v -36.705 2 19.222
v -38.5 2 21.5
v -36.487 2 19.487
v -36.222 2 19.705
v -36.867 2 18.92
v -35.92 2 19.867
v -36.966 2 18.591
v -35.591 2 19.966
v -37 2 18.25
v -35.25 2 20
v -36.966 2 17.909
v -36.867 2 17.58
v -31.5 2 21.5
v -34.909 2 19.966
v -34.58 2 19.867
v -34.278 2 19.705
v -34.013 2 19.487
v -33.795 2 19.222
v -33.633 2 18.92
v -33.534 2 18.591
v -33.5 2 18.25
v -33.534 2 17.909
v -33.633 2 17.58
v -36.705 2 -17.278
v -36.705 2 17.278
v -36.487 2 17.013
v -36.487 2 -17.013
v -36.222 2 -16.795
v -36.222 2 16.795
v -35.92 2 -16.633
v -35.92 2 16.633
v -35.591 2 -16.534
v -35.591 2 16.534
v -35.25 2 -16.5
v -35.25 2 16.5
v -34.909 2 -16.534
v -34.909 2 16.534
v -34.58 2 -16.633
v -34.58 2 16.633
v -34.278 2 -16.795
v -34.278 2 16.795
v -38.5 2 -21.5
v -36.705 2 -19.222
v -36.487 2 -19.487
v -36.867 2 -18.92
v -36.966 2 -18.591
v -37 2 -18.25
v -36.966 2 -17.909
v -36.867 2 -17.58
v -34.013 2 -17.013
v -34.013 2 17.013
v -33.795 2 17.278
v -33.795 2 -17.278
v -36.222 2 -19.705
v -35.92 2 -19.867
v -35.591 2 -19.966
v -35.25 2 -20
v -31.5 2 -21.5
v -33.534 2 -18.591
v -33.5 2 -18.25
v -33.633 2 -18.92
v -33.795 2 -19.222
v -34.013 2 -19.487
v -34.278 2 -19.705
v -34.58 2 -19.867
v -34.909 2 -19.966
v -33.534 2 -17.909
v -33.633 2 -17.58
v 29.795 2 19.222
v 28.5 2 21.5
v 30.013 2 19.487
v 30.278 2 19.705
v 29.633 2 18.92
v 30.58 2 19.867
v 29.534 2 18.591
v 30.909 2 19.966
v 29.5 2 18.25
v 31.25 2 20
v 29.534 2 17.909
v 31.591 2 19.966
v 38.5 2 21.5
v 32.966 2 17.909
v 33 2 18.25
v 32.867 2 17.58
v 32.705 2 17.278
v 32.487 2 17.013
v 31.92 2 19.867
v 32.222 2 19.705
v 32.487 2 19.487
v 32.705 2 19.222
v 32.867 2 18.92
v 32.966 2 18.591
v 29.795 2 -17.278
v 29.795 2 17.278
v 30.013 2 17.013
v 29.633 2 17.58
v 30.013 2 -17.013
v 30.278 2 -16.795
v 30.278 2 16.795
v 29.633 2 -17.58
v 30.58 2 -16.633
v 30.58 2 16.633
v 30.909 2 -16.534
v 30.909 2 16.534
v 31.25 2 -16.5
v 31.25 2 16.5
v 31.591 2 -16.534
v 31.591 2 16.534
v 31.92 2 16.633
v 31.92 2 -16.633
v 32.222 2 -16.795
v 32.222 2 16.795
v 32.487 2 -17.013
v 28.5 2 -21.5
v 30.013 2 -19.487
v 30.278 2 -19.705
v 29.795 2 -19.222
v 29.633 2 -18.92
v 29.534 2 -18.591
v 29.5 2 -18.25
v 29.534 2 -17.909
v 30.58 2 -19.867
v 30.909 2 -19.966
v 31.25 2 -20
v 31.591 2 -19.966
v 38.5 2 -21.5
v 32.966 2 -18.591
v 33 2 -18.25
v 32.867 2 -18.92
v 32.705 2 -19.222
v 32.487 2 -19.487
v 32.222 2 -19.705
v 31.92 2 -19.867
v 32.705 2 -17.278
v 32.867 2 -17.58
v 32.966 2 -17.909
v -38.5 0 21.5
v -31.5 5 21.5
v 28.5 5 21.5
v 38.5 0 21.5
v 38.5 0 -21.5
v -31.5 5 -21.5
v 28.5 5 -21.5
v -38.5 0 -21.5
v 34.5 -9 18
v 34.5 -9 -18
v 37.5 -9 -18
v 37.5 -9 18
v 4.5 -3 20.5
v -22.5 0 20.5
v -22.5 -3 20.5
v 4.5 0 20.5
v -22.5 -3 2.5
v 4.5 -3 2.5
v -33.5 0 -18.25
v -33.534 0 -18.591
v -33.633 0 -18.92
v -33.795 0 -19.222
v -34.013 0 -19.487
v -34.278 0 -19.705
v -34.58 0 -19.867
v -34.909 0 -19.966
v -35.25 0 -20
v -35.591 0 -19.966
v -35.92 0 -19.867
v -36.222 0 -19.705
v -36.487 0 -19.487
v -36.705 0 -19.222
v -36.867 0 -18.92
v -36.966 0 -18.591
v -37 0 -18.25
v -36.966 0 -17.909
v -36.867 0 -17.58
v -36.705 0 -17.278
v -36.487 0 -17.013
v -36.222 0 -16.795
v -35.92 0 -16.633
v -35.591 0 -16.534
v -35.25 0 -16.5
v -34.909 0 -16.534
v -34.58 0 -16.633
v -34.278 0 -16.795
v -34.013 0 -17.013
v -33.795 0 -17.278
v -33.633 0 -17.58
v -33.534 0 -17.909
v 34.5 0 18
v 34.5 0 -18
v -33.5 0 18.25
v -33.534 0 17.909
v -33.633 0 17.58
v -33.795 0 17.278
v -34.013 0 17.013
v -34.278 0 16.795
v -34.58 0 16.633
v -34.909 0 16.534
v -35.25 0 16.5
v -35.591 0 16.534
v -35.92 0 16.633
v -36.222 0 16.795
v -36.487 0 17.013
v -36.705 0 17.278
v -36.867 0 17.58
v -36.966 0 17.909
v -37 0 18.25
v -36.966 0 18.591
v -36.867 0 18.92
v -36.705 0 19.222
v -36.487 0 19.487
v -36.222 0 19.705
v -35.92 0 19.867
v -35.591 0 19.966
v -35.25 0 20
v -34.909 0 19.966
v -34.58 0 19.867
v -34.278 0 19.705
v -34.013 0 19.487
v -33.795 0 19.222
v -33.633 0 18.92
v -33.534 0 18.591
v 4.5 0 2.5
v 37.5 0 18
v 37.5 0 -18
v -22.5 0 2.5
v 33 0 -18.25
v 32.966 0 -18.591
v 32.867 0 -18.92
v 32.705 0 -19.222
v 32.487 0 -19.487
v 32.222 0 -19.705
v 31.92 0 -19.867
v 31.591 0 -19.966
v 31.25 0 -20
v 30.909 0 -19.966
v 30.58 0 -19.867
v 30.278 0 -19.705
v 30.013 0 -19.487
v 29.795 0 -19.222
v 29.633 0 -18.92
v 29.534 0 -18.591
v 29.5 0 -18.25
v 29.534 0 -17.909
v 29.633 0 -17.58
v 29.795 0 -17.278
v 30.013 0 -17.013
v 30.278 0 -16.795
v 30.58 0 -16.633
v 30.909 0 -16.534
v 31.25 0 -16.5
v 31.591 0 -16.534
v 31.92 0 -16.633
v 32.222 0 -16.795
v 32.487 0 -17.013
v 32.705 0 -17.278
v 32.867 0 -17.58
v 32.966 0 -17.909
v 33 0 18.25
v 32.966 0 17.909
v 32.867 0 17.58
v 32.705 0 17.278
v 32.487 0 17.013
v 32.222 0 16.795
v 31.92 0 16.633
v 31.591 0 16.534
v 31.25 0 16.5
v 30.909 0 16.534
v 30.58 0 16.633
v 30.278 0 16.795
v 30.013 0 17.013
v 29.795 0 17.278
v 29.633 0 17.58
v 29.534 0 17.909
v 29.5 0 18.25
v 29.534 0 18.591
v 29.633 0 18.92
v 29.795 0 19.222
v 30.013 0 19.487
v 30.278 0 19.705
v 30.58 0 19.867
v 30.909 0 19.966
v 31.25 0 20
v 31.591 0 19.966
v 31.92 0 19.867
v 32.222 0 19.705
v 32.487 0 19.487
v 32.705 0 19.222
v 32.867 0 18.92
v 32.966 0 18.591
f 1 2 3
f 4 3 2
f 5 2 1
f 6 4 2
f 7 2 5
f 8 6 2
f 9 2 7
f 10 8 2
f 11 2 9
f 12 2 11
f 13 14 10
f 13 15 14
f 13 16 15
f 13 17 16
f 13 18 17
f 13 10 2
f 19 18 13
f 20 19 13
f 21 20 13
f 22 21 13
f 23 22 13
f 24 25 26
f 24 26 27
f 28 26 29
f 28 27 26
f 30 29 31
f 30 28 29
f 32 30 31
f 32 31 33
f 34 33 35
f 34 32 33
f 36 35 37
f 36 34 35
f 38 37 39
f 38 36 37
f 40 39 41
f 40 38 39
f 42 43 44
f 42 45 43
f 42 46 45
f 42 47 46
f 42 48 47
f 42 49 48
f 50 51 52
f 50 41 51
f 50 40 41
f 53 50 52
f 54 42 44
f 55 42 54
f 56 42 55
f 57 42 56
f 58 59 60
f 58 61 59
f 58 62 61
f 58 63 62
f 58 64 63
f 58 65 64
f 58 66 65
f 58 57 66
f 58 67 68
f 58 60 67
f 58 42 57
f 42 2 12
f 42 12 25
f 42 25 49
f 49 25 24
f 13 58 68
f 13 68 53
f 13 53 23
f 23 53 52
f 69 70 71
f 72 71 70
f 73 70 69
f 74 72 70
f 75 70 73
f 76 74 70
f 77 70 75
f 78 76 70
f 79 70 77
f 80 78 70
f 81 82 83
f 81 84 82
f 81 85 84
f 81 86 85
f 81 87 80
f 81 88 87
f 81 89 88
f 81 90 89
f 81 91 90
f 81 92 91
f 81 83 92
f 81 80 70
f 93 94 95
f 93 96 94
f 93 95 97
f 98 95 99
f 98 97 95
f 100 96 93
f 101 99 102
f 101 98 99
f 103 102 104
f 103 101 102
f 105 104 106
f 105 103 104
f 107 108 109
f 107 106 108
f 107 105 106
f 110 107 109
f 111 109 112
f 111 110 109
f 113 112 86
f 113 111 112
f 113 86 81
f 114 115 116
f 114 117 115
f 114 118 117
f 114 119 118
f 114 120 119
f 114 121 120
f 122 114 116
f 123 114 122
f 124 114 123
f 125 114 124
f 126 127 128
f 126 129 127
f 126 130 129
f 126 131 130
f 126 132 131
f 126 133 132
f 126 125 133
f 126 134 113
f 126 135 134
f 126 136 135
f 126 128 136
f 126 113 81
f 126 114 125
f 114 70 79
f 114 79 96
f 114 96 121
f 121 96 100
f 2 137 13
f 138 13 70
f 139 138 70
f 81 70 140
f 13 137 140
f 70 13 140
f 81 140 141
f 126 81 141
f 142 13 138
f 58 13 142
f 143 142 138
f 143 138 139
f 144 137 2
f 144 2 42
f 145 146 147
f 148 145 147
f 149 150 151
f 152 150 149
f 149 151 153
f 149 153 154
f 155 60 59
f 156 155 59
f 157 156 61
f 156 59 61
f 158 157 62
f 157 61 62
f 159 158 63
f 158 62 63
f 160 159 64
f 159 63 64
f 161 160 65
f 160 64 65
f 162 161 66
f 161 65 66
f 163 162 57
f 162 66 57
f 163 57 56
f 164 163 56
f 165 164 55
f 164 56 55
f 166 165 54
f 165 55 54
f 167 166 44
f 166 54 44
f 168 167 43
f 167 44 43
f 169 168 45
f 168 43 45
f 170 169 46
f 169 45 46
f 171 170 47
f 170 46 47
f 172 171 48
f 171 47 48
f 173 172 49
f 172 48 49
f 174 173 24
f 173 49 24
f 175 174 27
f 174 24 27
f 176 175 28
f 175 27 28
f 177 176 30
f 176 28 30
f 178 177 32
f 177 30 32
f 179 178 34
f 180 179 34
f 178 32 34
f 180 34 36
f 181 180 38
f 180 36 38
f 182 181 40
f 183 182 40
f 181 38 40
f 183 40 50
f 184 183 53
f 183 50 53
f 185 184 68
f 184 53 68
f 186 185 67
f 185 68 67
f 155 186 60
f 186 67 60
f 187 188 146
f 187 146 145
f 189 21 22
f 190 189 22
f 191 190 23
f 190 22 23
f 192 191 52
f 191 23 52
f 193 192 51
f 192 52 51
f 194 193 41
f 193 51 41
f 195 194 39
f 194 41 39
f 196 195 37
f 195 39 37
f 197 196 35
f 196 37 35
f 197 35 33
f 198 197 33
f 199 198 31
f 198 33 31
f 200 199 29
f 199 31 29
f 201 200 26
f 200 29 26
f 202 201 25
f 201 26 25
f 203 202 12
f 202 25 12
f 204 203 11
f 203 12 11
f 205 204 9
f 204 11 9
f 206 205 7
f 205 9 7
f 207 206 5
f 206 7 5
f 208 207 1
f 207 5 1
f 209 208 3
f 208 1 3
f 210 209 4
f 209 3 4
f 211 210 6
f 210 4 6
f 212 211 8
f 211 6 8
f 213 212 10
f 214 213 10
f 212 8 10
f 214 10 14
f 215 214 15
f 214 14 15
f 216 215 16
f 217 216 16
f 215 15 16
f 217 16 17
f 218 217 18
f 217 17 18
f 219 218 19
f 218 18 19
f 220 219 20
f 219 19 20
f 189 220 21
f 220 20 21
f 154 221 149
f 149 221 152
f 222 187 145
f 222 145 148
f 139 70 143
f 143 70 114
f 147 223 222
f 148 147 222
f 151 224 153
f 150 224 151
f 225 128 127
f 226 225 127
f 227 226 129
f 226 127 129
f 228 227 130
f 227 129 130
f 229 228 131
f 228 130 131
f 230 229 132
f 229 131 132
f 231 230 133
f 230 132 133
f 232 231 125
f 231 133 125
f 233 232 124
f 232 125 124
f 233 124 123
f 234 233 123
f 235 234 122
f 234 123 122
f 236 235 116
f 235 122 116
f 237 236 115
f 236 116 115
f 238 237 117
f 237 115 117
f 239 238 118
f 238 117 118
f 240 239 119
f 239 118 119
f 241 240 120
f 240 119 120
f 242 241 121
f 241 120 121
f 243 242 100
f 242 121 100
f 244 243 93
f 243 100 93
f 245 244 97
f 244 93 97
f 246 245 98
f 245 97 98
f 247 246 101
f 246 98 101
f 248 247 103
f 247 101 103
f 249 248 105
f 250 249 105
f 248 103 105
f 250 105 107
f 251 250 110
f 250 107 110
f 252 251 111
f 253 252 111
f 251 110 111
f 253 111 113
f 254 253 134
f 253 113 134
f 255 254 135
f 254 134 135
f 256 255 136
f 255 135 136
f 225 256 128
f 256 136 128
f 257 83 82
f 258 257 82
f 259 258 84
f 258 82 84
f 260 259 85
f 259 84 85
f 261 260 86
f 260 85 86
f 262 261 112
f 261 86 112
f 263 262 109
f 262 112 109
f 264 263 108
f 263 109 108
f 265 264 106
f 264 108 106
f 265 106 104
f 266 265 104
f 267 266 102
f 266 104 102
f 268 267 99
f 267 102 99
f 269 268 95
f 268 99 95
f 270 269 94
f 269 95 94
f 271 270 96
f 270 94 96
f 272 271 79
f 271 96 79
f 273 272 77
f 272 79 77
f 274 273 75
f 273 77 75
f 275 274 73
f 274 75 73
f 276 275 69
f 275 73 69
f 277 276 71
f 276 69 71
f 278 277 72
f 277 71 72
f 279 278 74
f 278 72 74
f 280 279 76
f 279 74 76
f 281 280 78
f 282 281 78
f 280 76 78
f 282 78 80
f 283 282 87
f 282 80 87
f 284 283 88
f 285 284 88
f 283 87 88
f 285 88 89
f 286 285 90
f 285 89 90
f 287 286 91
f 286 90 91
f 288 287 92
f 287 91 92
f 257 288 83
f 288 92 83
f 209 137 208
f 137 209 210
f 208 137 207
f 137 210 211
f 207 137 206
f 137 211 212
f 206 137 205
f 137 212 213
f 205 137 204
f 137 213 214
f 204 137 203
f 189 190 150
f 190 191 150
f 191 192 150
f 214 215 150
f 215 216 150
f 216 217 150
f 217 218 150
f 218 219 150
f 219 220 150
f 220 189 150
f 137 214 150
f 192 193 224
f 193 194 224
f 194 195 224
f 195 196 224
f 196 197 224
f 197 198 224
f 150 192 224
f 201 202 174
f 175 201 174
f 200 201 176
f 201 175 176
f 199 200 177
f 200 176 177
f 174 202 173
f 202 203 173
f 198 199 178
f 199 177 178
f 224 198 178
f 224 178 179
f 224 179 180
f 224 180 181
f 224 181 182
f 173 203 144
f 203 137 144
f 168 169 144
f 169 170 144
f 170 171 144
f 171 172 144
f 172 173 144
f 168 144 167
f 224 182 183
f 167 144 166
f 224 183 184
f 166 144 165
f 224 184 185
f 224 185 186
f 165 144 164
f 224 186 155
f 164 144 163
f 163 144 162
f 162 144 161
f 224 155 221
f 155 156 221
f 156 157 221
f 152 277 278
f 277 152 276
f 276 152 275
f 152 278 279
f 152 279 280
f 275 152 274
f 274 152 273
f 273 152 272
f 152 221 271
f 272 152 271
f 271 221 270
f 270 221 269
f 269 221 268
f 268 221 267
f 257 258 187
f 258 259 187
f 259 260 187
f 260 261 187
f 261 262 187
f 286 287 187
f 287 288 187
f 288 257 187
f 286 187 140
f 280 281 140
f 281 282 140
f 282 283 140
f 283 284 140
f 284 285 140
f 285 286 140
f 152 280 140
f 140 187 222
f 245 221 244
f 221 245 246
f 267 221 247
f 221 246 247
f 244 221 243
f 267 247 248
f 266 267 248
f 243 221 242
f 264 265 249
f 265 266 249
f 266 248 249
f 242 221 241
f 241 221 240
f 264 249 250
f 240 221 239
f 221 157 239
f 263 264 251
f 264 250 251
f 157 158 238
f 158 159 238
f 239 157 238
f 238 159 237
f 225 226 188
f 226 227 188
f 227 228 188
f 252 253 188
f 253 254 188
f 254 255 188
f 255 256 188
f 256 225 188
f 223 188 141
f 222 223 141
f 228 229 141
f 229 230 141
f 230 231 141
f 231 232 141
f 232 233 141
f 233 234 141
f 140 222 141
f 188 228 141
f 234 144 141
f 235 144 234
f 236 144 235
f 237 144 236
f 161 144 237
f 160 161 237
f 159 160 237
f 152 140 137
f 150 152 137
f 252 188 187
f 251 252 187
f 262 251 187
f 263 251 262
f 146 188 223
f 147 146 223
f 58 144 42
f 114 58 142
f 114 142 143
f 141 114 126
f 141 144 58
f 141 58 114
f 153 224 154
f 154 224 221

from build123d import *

# Parameters (mm, degrees)
SKETCH1_W           = 60
SKETCH1_H           = 43
BOSS_EXTRUDE1_DEPTH = 5
SKETCH1_3_W         = 7
SKETCH1_3_H         = 43
SKETCH1_3_W_2       = 10
BOSS_EXTRUDE2_DEPTH = 2
SKETCH2_R           = 1.75
CUT_EXTRUDE1_DEPTH  = 2
SKETCH3_R           = 1.75
CUT_EXTRUDE2_DEPTH  = 2
SKETCH4_W           = 3
SKETCH4_H           = 36
BOSS_EXTRUDE3_DEPTH = 9
SKETCH5_W           = 27
SKETCH5_H           = 18
BOSS_EXTRUDE4_DEPTH = 3


with BuildPart() as part:
    # Sketch1 → Boss-Extrude1 (new body)
    with BuildSketch(Plane(origin=(0, 0, 0), x_dir=(1, 0, 0), z_dir=(0, 1, 0))):
        with Locations((-1.5, 0)):
            Rectangle(SKETCH1_W, SKETCH1_H)
    extrude(amount=BOSS_EXTRUDE1_DEPTH)

    # Sketch1<3> → Boss-Extrude2 (add)
    with BuildSketch(Plane(origin=(0, 0, 0), x_dir=(1, 0, 0), z_dir=(0, 1, 0))):
        with Locations((-35, 0)):
            Rectangle(SKETCH1_3_W, SKETCH1_3_H)
        with Locations((33.5, 0)):
            Rectangle(SKETCH1_3_W_2, SKETCH1_3_H)
    extrude(amount=BOSS_EXTRUDE2_DEPTH)

    # Sketch2 → Cut-Extrude1 (cut)
    with BuildSketch(Plane(origin=(0, 2, 0), x_dir=(1, 0, 0), z_dir=(0, 1, 0))):
        with Locations((31.25, 18.25)):
            Circle(SKETCH2_R)
        with Locations((31.25, -18.25)):
            Circle(SKETCH2_R)
    extrude(amount=-CUT_EXTRUDE1_DEPTH, mode=Mode.SUBTRACT)

    # Sketch3 → Cut-Extrude2 (cut)
    with BuildSketch(Plane(origin=(0, 2, 0), x_dir=(1, 0, 0), z_dir=(0, 1, 0))):
        with Locations((-35.25, 18.25)):
            Circle(SKETCH3_R)
        with Locations((-35.25, -18.25)):
            Circle(SKETCH3_R)
    extrude(amount=-CUT_EXTRUDE2_DEPTH, mode=Mode.SUBTRACT)

    # Sketch4 → Boss-Extrude3 (add)
    with BuildSketch(Plane.XZ):
        with Locations((36, 0)):
            Rectangle(SKETCH4_W, SKETCH4_H)
    extrude(amount=BOSS_EXTRUDE3_DEPTH)

    # Sketch5 → Boss-Extrude4 (add)
    with BuildSketch(Plane.XZ):
        with Locations((-9, 11.5)):
            Rectangle(SKETCH5_W, SKETCH5_H)
    extrude(amount=BOSS_EXTRUDE4_DEPTH)


solid = part.part
